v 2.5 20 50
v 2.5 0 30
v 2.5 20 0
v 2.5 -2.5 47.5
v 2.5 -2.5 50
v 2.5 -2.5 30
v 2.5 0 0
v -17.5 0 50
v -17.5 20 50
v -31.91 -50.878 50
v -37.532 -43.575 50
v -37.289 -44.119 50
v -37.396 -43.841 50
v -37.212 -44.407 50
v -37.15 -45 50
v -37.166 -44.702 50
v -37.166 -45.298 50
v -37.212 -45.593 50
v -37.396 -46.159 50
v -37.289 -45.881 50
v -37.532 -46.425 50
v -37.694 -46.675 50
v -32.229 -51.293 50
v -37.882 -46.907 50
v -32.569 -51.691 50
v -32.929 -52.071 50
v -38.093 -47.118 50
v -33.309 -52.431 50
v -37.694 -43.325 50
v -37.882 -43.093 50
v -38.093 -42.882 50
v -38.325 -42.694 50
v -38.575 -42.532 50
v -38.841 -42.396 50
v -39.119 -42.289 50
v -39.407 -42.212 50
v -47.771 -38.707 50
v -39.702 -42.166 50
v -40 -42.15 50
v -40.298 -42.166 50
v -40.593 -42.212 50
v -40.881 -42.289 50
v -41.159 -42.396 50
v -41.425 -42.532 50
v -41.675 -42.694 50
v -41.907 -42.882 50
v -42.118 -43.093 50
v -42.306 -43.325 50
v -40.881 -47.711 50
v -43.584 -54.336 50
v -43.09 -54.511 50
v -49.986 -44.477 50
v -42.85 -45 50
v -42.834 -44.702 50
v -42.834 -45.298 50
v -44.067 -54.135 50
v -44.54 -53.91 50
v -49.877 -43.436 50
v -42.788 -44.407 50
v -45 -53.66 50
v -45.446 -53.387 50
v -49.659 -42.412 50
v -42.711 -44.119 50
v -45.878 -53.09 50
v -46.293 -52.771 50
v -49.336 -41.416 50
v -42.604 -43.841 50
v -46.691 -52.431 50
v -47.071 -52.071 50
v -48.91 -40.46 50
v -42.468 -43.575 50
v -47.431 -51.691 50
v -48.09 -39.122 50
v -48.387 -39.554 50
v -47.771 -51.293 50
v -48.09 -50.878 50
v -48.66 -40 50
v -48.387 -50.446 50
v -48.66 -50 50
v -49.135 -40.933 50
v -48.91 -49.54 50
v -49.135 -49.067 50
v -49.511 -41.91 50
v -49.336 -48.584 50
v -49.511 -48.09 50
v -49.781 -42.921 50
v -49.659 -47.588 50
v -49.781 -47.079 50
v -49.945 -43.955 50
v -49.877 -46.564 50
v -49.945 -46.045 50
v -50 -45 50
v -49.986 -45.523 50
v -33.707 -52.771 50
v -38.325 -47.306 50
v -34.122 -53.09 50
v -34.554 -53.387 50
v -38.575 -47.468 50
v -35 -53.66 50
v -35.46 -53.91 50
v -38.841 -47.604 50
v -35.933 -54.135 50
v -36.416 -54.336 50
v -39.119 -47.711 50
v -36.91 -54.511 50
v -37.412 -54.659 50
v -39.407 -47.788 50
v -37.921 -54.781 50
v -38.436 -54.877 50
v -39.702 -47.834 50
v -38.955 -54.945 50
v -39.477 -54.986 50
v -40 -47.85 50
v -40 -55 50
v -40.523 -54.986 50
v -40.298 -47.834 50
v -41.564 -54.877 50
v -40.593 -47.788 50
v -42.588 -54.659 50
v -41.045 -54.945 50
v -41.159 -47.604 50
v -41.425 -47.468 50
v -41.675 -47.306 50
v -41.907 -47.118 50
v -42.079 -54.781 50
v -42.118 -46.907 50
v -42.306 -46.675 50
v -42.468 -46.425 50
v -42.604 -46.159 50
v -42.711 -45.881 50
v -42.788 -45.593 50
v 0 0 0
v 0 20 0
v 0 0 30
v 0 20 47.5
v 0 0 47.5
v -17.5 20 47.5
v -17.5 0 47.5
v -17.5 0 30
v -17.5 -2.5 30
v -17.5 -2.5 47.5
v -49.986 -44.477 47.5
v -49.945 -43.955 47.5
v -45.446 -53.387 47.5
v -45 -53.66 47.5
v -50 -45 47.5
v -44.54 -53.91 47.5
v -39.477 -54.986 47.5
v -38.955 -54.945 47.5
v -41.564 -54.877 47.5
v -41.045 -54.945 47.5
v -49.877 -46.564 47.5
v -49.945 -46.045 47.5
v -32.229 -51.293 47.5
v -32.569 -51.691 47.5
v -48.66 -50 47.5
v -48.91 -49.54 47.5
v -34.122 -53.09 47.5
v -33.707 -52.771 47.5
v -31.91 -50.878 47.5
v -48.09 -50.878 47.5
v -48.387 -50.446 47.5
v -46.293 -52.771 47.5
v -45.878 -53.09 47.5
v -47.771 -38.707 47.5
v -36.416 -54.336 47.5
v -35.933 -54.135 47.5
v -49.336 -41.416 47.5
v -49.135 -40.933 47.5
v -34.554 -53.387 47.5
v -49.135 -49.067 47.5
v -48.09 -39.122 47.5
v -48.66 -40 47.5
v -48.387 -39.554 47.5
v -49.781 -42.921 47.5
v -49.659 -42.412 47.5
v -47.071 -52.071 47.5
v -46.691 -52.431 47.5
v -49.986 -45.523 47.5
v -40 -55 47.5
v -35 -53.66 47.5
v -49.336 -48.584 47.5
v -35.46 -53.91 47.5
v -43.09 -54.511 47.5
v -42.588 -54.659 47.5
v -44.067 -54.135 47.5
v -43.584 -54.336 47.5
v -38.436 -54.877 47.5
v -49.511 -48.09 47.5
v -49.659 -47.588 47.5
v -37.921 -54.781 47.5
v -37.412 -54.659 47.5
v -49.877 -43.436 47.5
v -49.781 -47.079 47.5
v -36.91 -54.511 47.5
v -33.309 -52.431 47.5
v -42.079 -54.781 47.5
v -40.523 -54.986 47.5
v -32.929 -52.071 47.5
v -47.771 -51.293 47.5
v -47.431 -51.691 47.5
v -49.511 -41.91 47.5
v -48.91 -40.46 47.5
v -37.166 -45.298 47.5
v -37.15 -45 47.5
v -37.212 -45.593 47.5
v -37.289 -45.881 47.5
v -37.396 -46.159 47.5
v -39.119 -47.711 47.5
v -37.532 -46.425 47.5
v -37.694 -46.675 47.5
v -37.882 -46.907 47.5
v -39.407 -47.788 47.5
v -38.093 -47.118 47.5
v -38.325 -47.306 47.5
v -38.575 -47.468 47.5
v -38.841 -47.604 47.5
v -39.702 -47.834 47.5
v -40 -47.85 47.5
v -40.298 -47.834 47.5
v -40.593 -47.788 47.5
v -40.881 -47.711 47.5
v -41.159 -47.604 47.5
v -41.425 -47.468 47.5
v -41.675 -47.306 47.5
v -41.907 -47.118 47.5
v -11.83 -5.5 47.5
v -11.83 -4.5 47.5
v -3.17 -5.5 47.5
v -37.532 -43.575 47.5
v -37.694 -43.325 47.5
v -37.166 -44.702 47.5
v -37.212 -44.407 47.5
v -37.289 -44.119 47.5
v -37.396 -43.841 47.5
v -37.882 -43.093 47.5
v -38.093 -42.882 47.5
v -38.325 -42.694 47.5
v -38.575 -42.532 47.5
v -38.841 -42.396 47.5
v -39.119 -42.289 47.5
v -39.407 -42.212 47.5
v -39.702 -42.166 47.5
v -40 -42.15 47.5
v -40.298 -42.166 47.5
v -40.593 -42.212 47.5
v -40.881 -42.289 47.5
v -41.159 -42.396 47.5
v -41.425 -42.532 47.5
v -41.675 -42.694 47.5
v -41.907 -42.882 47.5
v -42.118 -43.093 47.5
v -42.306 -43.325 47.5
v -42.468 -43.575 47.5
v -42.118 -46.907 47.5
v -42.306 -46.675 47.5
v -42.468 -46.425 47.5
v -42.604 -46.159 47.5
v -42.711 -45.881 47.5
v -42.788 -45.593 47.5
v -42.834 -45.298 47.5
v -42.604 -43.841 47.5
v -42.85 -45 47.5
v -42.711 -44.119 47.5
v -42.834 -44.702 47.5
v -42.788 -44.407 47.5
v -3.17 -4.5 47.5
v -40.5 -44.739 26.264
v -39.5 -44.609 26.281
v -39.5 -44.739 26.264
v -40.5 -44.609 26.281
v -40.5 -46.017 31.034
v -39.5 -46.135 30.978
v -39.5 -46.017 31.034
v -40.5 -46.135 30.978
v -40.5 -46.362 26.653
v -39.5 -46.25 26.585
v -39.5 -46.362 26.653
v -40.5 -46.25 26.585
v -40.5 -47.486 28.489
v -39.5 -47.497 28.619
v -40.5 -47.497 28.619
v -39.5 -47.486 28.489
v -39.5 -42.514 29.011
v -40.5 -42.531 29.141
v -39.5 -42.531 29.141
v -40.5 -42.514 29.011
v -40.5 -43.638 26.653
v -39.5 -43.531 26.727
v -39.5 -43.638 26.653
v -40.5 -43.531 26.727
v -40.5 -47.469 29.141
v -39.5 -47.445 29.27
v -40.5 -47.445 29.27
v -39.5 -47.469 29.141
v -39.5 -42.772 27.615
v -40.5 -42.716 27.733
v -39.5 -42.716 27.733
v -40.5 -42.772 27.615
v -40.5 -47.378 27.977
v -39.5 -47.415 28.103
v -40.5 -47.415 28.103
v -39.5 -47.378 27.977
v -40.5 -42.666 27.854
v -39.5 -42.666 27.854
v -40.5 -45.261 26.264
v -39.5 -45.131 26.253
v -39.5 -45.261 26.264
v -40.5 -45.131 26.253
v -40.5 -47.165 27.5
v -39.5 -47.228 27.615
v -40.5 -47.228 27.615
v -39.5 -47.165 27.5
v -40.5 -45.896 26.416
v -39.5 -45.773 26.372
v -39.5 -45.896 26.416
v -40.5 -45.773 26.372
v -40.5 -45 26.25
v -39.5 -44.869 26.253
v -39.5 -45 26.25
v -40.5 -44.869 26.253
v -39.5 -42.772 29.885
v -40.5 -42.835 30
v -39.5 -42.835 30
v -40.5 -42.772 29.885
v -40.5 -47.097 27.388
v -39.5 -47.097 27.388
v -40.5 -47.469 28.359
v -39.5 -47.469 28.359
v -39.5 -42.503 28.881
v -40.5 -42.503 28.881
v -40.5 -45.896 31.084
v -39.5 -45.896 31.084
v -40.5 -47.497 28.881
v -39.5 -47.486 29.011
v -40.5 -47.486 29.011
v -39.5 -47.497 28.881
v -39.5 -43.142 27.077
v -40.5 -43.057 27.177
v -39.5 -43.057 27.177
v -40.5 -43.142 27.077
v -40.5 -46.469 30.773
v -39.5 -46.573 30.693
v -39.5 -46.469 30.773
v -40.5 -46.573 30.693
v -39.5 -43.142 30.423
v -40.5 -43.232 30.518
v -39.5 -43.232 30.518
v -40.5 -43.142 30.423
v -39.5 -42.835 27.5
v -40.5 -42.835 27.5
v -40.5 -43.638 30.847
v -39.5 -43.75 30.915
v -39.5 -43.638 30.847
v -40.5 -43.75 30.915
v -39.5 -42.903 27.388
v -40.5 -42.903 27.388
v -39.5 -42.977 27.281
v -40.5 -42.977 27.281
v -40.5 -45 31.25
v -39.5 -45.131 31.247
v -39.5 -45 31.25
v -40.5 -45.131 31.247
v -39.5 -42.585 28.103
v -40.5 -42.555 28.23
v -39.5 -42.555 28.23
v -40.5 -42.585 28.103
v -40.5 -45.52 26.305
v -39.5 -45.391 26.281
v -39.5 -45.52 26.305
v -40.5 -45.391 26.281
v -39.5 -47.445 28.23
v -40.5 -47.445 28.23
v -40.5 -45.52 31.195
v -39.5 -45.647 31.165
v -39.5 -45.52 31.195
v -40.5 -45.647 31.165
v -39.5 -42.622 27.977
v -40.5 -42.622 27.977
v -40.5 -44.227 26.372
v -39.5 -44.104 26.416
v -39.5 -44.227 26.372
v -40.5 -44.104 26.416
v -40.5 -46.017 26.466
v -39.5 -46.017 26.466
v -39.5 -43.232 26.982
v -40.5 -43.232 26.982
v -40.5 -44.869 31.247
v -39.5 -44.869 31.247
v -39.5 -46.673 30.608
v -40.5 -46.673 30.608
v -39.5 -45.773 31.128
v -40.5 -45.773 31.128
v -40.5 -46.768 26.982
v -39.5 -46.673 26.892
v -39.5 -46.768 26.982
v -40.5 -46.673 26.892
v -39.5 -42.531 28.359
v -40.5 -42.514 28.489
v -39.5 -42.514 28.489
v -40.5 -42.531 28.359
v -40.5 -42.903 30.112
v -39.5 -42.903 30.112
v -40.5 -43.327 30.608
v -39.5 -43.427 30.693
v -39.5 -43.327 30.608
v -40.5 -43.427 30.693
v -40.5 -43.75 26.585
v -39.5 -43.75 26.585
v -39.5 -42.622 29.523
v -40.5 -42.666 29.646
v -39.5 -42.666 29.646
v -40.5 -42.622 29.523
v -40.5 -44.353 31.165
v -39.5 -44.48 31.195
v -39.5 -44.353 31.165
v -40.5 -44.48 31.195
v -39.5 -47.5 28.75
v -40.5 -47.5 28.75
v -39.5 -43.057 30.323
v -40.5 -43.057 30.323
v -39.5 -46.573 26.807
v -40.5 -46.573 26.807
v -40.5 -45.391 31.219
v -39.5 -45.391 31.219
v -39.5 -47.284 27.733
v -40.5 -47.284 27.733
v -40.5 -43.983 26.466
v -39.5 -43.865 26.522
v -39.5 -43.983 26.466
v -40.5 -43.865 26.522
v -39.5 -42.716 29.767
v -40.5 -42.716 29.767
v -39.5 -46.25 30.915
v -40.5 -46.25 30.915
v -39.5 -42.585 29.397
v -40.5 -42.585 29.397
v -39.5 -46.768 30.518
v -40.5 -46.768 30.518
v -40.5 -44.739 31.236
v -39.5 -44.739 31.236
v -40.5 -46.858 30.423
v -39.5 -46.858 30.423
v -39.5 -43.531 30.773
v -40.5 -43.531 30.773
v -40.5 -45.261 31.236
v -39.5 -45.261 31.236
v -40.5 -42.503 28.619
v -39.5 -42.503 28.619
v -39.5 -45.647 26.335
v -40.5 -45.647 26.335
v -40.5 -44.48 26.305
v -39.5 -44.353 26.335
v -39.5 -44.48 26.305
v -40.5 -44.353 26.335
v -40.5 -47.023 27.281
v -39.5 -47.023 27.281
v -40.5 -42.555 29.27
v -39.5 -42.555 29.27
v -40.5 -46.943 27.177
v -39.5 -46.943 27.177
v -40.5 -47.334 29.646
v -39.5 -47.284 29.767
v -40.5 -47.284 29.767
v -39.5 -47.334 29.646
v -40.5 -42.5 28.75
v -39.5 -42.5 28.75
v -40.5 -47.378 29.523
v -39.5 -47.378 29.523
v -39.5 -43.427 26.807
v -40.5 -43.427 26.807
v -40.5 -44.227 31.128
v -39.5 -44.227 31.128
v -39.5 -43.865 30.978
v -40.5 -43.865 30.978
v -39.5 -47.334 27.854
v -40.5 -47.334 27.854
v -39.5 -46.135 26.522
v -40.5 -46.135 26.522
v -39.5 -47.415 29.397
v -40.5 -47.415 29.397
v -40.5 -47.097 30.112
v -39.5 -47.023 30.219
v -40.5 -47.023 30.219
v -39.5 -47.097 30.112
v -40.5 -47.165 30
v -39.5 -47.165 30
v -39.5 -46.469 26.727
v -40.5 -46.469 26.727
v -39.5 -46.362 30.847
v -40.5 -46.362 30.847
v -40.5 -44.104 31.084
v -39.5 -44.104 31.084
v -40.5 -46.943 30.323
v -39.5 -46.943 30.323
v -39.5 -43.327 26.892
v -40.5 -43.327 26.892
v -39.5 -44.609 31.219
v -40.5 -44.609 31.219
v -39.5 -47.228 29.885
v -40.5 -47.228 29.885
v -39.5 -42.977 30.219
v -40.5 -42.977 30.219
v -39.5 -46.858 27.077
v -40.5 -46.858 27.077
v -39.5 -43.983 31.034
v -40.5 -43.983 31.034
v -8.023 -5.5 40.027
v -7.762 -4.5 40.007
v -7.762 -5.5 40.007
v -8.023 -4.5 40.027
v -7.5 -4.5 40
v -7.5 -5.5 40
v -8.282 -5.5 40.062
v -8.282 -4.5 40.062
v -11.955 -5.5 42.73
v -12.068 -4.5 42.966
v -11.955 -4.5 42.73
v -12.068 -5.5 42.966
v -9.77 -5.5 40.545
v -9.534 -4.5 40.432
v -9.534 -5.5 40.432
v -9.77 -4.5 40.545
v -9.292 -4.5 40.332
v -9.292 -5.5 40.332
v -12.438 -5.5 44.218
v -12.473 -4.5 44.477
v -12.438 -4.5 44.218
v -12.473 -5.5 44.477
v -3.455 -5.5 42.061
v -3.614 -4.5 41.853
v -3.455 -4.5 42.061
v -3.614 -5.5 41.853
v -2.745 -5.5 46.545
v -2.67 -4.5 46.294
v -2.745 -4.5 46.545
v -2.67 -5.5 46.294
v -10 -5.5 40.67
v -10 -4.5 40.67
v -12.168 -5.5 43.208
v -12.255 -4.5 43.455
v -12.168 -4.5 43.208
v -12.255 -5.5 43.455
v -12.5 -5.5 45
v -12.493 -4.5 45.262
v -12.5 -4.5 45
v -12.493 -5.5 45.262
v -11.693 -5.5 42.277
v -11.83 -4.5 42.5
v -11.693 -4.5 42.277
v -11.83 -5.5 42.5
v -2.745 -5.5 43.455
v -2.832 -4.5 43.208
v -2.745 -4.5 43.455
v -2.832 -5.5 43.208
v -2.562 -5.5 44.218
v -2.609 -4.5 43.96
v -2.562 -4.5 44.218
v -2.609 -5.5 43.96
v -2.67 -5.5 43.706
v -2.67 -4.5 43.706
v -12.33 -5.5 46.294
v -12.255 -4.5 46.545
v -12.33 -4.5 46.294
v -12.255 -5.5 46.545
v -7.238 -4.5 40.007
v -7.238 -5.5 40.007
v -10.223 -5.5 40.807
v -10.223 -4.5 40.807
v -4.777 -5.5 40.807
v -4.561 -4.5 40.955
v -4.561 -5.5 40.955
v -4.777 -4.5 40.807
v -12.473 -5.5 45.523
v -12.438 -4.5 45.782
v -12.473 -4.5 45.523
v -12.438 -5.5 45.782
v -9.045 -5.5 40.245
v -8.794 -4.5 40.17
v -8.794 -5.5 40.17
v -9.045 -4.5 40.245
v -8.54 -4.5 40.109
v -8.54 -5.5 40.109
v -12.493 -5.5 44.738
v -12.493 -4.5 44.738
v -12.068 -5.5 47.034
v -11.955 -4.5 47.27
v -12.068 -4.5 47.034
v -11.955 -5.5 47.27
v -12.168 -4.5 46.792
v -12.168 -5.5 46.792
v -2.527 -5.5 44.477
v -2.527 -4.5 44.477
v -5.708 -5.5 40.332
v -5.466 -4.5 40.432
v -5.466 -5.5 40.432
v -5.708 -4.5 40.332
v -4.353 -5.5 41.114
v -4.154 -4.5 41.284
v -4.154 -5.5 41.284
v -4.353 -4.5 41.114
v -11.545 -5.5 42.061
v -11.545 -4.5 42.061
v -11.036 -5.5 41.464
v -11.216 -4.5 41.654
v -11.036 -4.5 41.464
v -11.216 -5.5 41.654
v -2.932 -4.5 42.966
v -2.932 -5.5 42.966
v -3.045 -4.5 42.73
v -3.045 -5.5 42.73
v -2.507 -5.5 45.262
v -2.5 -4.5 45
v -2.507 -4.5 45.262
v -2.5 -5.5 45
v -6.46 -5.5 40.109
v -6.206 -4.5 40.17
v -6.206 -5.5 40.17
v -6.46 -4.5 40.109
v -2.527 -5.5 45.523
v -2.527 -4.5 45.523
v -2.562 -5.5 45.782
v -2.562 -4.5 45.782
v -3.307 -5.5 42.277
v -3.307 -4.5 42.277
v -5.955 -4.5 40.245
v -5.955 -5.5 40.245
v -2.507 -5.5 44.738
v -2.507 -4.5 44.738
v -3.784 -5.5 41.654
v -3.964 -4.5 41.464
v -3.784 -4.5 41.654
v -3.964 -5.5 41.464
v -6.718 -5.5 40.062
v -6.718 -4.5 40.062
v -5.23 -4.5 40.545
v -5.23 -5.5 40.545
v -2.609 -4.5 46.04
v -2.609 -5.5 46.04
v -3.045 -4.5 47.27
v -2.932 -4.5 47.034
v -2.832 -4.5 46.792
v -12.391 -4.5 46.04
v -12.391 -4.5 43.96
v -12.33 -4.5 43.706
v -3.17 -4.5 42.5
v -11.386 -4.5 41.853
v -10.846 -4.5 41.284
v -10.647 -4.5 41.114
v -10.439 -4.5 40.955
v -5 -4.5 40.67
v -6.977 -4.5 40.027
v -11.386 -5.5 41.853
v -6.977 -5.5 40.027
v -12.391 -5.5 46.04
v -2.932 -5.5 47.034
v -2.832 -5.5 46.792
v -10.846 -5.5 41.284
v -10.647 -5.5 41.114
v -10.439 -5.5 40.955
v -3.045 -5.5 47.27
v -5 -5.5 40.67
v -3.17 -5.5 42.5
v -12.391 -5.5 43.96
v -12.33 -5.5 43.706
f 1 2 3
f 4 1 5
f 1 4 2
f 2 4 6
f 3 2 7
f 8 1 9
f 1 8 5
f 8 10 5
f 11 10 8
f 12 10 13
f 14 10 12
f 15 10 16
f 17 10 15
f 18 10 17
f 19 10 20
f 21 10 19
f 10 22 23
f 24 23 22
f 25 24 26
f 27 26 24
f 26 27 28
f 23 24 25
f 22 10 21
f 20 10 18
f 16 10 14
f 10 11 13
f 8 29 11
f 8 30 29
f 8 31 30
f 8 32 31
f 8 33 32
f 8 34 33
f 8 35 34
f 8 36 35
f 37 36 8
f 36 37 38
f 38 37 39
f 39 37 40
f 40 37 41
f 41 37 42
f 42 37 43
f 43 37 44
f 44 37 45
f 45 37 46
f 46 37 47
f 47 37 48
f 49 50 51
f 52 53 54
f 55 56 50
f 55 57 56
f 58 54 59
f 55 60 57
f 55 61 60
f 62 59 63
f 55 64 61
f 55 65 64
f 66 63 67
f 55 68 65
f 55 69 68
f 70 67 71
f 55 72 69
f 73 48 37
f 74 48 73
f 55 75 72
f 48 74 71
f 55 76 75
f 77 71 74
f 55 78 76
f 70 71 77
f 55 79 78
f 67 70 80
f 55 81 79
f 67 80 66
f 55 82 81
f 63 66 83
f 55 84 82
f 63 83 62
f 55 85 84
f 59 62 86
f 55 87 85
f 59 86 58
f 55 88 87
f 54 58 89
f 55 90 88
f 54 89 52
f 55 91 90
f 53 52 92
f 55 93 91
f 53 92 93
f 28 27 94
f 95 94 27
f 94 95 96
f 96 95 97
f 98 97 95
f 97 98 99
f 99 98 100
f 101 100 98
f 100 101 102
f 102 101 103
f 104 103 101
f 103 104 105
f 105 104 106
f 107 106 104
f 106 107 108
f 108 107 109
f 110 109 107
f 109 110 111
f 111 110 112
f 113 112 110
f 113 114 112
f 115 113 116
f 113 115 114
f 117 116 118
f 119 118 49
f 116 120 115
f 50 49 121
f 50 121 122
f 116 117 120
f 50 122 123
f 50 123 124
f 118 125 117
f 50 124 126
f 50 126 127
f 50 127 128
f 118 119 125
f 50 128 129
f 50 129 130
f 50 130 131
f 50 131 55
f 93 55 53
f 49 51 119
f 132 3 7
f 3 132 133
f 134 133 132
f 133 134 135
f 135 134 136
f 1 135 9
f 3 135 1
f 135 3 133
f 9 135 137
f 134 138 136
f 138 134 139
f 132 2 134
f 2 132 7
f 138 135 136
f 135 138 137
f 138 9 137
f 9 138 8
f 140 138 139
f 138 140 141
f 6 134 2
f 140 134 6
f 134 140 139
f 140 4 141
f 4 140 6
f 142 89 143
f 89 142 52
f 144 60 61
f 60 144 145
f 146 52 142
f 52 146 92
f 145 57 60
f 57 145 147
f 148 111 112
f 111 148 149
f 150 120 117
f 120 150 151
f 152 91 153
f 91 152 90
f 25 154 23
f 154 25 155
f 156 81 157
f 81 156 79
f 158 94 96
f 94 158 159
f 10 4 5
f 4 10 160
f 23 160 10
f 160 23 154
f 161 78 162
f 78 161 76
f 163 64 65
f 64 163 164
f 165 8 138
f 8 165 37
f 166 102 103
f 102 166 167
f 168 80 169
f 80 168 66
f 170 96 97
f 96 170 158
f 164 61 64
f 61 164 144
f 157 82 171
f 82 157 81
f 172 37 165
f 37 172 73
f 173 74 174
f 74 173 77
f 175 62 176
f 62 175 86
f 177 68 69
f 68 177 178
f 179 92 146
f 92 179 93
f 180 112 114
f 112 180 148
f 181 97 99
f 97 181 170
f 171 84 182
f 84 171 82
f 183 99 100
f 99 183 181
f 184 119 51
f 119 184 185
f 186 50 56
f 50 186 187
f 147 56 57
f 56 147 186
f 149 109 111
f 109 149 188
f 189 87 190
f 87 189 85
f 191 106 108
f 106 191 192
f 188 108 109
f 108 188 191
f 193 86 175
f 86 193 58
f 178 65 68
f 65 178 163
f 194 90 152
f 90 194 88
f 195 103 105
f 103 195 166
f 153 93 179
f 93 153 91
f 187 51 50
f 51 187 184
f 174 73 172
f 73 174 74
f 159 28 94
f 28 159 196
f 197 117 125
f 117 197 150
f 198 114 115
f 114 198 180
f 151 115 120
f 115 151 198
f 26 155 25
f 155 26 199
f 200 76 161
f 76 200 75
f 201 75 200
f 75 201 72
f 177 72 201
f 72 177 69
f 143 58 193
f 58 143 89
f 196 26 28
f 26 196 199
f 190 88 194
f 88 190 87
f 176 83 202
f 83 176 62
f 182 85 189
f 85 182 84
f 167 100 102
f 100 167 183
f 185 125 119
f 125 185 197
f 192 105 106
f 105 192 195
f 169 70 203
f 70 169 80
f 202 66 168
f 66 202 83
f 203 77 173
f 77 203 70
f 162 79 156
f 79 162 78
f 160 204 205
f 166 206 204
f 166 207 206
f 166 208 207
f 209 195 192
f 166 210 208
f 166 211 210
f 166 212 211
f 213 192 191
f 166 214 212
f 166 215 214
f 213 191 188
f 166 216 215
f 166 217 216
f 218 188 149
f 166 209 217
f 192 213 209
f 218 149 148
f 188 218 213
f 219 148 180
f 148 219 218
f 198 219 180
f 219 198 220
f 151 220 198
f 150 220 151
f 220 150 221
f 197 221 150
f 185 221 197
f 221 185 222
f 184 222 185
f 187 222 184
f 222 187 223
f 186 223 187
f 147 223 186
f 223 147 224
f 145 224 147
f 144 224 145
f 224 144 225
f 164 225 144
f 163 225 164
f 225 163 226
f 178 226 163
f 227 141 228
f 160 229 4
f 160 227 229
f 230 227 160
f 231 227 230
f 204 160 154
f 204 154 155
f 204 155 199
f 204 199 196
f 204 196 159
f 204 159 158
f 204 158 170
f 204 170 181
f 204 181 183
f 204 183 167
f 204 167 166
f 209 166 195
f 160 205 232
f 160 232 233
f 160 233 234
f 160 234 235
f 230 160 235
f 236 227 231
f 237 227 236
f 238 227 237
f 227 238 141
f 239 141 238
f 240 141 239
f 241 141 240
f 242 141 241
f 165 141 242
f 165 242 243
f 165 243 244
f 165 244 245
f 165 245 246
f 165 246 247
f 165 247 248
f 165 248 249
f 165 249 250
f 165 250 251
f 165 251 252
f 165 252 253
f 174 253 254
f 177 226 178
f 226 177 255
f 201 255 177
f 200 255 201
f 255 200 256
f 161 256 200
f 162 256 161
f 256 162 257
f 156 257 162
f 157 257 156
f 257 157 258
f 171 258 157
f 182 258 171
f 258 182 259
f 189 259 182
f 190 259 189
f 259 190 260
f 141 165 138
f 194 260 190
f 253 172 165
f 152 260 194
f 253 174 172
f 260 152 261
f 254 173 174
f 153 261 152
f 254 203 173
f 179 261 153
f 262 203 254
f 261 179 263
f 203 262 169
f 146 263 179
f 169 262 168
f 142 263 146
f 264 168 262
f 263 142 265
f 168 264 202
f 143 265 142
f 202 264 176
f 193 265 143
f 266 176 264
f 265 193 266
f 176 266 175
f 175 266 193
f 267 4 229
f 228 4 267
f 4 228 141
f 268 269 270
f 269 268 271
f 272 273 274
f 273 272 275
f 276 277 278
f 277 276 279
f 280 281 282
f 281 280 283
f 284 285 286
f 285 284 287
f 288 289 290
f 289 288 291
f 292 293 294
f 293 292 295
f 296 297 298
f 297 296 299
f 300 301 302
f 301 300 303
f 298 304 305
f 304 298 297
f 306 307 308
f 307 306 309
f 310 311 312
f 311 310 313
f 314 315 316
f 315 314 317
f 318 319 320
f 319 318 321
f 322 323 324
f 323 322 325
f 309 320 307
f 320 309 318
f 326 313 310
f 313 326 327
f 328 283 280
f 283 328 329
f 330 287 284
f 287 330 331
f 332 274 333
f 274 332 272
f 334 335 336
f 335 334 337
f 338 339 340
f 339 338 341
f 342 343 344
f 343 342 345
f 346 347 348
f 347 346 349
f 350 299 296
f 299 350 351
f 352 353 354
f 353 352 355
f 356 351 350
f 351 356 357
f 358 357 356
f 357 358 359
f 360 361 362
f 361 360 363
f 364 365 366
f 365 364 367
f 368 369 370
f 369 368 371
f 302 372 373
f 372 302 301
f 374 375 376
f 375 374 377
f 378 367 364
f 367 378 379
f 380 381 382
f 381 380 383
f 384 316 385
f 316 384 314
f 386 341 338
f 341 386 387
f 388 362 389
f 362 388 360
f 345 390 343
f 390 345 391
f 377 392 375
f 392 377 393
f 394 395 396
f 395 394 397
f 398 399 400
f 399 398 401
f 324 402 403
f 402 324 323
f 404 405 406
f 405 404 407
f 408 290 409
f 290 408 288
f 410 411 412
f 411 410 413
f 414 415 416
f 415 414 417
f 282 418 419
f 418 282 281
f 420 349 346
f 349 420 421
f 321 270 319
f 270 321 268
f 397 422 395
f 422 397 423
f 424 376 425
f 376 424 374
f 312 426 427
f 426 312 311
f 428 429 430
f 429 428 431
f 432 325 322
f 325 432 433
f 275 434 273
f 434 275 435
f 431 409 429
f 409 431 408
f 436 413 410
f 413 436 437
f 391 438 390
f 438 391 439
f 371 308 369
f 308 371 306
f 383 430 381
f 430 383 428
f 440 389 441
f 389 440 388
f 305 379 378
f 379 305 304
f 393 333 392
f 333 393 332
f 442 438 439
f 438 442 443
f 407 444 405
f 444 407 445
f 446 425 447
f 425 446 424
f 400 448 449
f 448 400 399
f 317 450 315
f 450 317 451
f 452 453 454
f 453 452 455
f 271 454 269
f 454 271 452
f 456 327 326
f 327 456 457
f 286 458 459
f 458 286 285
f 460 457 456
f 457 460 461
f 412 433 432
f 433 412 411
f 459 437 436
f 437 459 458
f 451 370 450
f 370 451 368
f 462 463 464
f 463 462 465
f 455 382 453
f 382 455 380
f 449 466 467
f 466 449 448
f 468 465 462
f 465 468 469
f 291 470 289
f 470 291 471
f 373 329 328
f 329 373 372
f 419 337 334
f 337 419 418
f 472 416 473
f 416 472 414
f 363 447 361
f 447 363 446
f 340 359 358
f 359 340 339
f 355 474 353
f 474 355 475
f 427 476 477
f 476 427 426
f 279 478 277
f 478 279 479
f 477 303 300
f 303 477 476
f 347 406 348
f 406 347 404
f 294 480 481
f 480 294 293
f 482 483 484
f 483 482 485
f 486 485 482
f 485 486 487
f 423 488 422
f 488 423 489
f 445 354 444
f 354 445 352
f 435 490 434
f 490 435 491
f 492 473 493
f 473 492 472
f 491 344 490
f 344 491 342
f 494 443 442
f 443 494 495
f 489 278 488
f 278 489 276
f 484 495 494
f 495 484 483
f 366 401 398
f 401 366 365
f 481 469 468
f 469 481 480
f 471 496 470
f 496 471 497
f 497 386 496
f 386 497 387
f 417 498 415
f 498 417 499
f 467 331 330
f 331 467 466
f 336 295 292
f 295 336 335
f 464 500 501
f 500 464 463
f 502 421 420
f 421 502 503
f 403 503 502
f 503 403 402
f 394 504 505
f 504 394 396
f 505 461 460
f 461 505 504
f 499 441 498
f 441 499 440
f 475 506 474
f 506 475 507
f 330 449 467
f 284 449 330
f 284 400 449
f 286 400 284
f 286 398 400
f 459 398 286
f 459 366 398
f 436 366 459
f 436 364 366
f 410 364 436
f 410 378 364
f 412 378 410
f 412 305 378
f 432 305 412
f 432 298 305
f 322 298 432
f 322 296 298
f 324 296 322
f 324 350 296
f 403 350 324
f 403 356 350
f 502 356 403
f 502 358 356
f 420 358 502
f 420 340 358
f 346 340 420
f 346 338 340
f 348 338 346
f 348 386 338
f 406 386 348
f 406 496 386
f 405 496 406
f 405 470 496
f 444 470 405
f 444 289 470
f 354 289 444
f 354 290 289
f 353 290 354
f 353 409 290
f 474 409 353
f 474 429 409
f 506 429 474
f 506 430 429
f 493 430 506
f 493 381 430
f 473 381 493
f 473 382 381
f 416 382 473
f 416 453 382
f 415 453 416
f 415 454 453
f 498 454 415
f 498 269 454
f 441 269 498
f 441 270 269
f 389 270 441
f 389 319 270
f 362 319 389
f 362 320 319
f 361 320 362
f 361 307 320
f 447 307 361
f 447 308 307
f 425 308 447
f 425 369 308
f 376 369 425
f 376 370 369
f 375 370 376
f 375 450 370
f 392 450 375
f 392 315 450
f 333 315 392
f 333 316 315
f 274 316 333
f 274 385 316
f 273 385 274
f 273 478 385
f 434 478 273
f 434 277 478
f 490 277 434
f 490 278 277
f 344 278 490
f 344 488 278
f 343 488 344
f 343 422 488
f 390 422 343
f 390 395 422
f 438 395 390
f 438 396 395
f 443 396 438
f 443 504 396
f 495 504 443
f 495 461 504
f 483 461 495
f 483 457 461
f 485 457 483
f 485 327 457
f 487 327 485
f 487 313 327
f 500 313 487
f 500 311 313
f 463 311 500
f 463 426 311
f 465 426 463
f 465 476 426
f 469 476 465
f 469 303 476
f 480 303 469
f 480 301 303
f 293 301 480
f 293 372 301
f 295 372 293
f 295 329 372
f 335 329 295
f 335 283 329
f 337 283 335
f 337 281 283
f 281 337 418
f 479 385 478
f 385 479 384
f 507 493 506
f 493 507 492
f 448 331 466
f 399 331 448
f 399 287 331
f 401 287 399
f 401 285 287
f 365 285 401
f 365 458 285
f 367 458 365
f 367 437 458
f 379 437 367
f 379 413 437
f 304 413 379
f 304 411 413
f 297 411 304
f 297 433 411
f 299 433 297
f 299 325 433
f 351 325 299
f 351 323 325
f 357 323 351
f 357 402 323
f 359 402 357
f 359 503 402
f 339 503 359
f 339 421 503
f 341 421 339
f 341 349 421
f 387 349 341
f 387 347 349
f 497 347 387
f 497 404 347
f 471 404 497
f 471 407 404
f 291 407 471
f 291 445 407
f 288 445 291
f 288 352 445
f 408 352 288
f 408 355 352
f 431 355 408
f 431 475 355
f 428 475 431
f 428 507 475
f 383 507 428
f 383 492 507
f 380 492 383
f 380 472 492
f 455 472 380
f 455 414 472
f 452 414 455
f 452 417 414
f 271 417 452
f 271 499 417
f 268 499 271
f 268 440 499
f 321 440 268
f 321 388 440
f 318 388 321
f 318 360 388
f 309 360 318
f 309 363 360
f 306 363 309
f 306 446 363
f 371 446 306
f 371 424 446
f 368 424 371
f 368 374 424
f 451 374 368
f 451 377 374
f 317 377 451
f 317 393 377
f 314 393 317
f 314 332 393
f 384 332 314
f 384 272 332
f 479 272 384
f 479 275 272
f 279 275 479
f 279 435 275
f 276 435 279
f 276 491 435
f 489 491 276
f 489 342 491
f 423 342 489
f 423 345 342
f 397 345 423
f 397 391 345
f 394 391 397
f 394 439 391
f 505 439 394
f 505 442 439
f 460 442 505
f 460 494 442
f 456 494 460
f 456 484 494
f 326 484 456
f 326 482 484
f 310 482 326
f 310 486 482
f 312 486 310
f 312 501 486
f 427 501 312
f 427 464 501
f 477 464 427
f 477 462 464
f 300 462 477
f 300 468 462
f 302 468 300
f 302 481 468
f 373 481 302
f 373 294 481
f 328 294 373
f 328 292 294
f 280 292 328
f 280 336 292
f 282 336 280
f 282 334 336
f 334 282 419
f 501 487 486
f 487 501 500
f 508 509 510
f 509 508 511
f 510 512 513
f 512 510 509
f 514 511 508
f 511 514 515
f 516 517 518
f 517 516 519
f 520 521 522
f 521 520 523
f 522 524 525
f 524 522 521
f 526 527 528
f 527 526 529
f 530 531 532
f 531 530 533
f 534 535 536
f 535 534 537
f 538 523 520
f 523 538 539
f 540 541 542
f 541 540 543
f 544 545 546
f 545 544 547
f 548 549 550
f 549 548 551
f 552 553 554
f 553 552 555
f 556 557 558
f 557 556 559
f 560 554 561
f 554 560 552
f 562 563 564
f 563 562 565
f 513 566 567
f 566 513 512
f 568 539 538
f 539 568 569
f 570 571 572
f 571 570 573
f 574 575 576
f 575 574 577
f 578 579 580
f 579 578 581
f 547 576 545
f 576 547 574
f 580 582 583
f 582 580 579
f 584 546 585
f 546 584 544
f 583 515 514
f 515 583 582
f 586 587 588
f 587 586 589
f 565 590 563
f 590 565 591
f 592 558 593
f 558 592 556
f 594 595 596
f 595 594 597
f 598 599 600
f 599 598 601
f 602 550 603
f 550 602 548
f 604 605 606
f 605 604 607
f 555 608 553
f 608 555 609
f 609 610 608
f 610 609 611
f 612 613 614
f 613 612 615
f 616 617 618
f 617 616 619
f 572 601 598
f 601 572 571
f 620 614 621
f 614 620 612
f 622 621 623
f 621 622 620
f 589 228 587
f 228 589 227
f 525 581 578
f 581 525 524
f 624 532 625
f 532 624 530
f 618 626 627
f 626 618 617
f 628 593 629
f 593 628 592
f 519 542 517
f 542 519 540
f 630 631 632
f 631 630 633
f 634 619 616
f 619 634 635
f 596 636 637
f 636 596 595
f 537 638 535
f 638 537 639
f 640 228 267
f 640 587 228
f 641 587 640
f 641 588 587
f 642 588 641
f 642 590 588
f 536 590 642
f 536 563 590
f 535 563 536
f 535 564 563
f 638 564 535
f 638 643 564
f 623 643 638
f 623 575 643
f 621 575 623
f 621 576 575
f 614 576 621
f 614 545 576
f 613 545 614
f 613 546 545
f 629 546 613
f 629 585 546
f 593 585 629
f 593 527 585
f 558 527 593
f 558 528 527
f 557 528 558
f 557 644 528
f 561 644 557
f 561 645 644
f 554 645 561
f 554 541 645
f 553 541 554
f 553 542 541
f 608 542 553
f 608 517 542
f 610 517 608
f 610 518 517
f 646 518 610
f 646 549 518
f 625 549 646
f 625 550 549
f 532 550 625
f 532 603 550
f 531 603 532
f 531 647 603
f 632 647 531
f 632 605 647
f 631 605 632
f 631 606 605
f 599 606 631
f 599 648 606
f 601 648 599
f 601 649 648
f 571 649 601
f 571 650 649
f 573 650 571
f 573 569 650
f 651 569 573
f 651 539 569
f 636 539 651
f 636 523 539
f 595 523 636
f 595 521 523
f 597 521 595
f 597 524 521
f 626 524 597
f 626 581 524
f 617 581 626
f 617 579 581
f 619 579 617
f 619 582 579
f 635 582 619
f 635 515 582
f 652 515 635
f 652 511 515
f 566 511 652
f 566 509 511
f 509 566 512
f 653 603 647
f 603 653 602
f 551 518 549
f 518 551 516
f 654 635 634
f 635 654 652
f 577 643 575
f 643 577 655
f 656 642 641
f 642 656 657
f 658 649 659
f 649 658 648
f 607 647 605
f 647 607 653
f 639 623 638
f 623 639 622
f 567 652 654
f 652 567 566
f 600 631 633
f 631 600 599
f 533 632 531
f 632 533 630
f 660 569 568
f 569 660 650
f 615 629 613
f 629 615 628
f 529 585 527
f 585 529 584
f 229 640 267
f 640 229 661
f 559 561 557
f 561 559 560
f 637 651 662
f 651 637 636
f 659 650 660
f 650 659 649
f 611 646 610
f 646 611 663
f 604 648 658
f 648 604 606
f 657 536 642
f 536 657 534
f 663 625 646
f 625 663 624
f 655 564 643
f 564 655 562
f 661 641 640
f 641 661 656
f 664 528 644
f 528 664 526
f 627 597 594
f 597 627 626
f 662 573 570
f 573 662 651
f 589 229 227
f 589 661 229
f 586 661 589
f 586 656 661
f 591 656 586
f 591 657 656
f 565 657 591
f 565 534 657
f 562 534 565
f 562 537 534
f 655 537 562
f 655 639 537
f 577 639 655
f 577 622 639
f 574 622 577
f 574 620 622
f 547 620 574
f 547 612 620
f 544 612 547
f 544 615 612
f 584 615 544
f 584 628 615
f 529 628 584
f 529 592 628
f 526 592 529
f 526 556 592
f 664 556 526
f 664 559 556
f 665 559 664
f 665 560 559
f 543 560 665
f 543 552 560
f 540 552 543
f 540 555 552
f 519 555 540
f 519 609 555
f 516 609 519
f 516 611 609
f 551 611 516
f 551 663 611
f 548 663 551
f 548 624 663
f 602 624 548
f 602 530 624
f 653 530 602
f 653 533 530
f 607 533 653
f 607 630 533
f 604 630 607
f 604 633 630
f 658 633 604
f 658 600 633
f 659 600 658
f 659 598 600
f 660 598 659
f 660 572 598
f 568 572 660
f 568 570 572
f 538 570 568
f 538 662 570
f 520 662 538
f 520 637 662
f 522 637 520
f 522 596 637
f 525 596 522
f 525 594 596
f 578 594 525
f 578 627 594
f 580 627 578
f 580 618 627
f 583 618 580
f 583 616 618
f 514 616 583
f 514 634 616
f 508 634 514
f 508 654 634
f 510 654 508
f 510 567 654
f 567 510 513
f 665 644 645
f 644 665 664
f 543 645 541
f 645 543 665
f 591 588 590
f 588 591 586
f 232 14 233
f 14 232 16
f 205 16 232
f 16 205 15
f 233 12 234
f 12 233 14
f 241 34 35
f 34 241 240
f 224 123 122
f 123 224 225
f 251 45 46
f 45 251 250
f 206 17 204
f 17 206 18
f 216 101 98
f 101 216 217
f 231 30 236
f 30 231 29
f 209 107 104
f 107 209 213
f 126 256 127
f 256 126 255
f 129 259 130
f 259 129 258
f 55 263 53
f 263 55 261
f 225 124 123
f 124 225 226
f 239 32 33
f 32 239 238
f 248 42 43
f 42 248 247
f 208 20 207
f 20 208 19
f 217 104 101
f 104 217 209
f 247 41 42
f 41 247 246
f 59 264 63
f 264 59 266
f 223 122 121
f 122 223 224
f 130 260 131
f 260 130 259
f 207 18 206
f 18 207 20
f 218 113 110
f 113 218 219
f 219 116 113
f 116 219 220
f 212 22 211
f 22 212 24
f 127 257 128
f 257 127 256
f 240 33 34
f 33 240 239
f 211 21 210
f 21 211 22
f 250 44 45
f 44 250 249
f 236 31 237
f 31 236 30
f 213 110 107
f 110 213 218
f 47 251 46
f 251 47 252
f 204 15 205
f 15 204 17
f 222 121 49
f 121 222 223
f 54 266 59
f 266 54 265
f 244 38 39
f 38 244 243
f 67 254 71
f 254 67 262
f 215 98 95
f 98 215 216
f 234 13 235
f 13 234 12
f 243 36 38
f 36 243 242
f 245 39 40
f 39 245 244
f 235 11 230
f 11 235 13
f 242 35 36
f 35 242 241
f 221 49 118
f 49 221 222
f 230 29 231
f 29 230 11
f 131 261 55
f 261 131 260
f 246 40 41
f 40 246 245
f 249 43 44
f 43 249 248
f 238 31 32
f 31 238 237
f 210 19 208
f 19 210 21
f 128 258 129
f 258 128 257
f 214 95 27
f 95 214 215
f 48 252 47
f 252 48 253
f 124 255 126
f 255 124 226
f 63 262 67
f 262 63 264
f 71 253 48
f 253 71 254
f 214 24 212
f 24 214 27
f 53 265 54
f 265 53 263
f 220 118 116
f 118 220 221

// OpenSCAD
difference(){
  union(){
    translate([1.25,10,25]) cube([2.5,20,50],center=true);
    translate([-7.5,10,48.75]) cube([20,20,2.5],center=true);
    translate([-7.5,-1.25,40]) cube([20,2.5,20],center=true);
    hull(){
      translate([-7.5,-1.25,48.75]) cube([20,2.5,2.5],center=true);
      translate([-40,-45,48.75]) cylinder(d=20, h=2.5, center=true, $fn=120);
    }
    translate([-40,-45,28.75]) rotate([0,90,0]) cylinder(d=5, h=1, center=true, $fn=120);
    translate([-7.5,-5,45]) rotate([0,90,90]) cylinder(d=10, h=1, center=true, $fn=120);
  }
  translate([-40,-45,50]) rotate([0,0,0]) cylinder(d=5.7, h=11, center=true, $fn=60);
}
